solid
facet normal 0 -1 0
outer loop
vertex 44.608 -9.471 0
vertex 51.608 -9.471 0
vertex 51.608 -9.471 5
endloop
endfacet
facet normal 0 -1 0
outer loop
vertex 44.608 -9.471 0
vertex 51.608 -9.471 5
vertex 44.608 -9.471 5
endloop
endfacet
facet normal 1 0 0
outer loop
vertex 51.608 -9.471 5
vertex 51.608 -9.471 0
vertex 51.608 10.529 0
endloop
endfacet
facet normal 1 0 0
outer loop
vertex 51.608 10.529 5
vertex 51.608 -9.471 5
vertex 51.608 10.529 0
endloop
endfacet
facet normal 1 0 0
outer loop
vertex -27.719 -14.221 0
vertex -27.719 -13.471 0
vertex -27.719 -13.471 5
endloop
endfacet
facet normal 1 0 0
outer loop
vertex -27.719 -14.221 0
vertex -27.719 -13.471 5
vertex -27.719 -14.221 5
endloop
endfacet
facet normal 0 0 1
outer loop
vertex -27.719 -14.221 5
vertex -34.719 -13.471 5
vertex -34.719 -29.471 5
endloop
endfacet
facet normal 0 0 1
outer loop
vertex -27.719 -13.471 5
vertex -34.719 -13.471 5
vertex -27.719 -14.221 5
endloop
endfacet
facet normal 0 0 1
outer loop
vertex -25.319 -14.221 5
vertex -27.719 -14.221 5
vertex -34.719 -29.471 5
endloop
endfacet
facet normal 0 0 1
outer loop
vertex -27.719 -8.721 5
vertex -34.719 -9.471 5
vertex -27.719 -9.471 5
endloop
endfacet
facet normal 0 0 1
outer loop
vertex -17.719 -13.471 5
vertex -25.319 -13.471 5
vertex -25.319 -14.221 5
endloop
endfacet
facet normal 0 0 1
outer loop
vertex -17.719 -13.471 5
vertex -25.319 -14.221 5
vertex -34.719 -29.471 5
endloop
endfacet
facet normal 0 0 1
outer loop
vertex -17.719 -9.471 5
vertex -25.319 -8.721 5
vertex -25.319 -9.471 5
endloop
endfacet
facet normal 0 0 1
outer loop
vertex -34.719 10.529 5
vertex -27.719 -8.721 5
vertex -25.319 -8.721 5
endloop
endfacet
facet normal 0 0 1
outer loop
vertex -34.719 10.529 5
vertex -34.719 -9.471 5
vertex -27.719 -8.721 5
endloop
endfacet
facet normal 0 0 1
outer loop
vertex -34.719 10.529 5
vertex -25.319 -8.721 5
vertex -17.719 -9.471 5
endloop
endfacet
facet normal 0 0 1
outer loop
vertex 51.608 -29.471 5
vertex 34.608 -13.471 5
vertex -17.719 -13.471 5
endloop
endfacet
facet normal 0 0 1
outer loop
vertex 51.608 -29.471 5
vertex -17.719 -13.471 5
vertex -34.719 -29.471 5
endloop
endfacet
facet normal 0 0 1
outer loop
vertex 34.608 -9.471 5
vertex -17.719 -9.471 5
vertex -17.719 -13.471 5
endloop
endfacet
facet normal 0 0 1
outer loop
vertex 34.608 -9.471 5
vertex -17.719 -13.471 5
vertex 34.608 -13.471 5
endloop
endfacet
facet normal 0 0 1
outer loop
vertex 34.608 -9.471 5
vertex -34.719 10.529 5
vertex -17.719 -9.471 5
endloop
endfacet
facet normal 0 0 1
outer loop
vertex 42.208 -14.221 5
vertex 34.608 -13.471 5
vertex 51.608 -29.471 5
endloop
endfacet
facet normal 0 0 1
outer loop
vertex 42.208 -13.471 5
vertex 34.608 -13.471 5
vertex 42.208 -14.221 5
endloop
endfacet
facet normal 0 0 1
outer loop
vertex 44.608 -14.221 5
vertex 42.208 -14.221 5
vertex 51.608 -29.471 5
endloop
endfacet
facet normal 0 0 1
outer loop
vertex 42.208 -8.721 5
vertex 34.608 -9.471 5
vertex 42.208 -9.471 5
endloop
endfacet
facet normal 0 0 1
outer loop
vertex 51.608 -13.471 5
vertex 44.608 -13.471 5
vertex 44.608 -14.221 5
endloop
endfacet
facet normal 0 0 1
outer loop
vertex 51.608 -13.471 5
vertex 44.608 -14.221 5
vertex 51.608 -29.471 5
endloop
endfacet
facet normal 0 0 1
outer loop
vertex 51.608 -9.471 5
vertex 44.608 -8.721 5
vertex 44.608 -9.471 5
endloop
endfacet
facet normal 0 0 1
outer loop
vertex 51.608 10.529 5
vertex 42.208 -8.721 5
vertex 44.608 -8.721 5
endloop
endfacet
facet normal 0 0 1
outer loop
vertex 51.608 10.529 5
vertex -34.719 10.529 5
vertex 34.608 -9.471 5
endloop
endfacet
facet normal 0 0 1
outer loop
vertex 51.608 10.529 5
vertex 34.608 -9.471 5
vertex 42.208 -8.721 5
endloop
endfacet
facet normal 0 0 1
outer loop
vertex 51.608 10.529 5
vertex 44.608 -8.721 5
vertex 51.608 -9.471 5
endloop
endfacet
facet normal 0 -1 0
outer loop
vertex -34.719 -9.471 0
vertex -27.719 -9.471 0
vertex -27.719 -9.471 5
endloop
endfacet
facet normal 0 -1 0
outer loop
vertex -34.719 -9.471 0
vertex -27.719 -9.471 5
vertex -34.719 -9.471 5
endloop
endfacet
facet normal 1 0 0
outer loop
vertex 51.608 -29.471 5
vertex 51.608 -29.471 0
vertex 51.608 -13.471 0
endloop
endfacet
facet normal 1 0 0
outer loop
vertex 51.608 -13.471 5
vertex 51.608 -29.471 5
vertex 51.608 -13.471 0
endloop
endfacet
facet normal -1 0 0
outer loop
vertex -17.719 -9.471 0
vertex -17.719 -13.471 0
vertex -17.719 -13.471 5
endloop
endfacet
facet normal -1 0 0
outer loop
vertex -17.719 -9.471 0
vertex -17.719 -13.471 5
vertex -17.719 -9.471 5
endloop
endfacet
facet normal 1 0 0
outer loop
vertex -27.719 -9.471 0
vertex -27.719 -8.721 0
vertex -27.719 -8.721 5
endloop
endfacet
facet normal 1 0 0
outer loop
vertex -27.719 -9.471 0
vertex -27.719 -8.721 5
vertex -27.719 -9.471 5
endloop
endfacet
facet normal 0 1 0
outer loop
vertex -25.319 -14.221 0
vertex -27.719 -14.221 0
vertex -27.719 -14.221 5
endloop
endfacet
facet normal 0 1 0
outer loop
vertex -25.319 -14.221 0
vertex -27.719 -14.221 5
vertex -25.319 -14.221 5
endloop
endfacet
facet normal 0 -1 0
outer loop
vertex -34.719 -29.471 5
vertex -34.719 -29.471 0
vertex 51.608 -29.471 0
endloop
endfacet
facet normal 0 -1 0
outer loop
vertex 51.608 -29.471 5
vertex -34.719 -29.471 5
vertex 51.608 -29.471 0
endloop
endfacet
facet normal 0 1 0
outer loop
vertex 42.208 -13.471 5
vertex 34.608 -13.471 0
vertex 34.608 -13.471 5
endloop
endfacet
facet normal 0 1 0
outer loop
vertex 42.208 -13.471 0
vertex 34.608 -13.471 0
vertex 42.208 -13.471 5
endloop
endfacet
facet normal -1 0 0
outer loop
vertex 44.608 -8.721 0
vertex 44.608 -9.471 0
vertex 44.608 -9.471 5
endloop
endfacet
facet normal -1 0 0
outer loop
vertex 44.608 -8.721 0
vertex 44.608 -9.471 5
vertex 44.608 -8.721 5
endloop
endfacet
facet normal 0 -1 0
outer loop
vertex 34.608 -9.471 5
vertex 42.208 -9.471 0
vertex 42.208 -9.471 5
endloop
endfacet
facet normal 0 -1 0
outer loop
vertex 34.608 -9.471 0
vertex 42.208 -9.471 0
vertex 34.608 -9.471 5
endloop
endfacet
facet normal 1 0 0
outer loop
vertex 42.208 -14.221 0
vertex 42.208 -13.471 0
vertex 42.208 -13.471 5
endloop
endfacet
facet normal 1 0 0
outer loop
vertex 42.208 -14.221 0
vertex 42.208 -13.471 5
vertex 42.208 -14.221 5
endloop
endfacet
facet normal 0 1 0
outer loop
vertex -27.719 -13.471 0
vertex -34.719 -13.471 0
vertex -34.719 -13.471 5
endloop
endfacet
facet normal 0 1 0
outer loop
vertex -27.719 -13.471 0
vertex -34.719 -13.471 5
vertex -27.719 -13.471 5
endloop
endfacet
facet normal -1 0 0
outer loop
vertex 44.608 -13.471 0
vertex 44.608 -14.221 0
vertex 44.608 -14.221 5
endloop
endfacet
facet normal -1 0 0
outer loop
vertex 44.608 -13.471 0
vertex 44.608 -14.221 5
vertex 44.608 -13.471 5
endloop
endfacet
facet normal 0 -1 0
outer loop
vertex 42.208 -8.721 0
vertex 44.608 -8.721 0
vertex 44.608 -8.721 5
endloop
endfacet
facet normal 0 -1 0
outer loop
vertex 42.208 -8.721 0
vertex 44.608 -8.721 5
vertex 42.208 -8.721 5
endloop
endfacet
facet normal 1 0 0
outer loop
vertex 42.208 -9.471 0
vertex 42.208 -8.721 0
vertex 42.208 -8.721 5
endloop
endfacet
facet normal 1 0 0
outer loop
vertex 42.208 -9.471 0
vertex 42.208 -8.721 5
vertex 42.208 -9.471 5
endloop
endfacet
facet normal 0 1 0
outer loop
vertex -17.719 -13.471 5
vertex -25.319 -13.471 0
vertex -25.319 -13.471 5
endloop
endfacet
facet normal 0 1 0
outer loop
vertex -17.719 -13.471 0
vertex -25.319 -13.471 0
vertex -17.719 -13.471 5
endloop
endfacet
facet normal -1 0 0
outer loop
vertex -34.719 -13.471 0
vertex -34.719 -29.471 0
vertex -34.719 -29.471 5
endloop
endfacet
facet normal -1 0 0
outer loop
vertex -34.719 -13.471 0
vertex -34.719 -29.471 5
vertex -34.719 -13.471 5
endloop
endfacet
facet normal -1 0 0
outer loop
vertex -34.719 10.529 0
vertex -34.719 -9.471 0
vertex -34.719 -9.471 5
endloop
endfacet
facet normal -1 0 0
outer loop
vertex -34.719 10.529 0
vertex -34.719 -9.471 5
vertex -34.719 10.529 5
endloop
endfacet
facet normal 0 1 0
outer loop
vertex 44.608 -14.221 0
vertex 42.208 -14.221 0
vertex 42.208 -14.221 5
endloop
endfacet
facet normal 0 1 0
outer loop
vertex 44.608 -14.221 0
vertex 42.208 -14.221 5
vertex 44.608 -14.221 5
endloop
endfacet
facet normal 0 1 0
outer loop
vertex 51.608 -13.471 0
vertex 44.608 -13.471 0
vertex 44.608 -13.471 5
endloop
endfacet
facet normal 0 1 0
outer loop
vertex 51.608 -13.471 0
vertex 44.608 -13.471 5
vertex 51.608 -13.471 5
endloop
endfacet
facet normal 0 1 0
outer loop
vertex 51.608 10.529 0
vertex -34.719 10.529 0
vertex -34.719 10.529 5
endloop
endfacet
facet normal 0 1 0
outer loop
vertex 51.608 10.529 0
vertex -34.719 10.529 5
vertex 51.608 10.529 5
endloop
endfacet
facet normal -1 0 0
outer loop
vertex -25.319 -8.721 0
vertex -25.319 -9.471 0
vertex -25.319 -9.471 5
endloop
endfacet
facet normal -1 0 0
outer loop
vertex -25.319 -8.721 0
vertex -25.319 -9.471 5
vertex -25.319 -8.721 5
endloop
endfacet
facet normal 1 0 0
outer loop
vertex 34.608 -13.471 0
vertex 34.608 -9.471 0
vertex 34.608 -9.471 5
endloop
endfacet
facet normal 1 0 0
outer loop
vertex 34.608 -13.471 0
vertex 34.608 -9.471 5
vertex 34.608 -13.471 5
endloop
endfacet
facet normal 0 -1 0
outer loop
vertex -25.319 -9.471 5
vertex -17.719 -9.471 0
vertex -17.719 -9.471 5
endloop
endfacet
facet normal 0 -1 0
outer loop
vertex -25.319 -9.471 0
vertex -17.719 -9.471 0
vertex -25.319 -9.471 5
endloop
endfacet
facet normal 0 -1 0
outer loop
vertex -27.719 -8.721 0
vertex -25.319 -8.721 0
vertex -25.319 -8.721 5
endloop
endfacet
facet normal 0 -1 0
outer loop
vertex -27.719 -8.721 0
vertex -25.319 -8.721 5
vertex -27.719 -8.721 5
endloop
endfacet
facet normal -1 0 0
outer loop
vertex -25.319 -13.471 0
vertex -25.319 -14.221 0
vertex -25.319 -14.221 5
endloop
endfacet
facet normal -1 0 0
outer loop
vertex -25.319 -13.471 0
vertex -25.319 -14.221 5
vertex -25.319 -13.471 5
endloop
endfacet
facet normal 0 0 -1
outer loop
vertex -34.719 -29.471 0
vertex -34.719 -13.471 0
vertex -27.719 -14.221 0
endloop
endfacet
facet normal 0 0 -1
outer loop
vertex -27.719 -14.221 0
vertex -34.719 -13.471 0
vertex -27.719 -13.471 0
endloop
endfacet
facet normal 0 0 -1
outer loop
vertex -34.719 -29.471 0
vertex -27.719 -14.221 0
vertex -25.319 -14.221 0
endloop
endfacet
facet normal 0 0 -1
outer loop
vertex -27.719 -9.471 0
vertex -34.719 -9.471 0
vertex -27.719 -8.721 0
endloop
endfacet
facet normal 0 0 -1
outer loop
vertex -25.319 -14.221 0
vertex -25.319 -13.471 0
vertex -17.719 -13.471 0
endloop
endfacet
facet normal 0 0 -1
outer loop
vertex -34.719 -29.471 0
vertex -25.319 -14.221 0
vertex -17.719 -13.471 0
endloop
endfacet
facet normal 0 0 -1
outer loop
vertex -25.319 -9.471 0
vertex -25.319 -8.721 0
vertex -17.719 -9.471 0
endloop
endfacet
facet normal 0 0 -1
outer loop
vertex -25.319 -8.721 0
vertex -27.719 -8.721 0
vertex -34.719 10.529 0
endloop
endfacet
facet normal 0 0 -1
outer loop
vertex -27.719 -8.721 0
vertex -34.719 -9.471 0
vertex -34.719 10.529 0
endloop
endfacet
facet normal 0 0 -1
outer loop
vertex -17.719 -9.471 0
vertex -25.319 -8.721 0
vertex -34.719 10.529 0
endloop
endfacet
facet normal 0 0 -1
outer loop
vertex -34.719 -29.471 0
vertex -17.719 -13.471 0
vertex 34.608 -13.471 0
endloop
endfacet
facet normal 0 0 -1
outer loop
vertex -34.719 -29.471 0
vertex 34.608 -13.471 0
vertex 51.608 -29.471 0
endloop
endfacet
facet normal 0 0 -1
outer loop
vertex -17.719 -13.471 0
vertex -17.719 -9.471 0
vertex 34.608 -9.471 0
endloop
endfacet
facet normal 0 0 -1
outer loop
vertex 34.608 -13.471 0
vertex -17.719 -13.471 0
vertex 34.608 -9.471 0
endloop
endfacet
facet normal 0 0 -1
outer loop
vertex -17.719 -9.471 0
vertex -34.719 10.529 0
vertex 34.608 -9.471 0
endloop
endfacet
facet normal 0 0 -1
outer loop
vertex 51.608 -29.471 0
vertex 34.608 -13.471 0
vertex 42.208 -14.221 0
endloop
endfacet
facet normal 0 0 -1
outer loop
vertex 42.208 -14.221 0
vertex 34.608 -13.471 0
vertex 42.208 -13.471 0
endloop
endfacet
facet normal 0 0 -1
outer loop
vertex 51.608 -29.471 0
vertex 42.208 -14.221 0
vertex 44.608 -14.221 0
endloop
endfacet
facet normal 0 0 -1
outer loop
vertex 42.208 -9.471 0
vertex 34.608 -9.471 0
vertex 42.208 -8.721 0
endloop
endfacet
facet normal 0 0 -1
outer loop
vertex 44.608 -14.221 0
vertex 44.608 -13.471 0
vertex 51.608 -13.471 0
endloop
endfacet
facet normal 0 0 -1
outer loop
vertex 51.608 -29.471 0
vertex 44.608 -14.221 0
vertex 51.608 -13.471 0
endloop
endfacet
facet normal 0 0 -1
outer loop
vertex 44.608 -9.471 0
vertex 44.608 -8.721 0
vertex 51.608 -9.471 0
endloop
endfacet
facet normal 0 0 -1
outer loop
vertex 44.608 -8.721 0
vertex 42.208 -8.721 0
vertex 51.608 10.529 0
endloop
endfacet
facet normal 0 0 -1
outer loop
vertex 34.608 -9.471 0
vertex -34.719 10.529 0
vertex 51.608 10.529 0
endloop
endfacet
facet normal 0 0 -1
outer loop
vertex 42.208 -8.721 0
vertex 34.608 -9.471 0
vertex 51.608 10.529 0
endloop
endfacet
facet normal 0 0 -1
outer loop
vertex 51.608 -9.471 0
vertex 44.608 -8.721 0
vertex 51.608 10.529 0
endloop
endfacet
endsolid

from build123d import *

# Parameters (mm, degrees)
SKETCH1_W           = 86.32648043
SKETCH1_H           = 40
BOSS_EXTRUDE1_DEPTH = 5
CUT_EXTRUDE1_DEPTH  = 10


with BuildPart() as part:
    # Sketch1 → Boss-Extrude1 (new body)
    with BuildSketch(Plane.XY):
        with Locations((8.444686318, -9.471450325)):
            Rectangle(SKETCH1_W, SKETCH1_H)
    extrude(amount=BOSS_EXTRUDE1_DEPTH)

    # Sketch2 → Cut-Extrude1 (cut)
    with BuildSketch(Plane(origin=(0, 0, 0), x_dir=(-1, 0, 0), z_dir=(0, 0, -1))):
        Polygon((-51.607926533, -9.471450325), (-44.607926533, -9.471450325), (-44.607926533, -8.721450325), (-42.207926533, -8.721450325), (-42.207926533, -9.471450325), (-34.607926533, -9.471450325), (-34.607926533, -13.471450325), (-42.207926533, -13.471450325), (-42.207926533, -14.221450325), (-44.607926533, -14.221450325), (-44.607926533, -13.471450325), (-51.607926533, -13.471450325), align=None)
        Polygon((34.718553897, -9.471450325), (34.718553897, -13.471450325), (27.718553897, -13.471450325), (27.718553897, -14.221450325), (25.318553897, -14.221450325), (25.318553897, -13.471450325), (17.718553897, -13.471450325), (17.718553897, -9.471450325), (25.318553897, -9.471450325), (25.318553897, -8.721450325), (27.718553897, -8.721450325), (27.718553897, -9.471450325), align=None)
    extrude(amount=-CUT_EXTRUDE1_DEPTH, mode=Mode.SUBTRACT)


solid = part.part
